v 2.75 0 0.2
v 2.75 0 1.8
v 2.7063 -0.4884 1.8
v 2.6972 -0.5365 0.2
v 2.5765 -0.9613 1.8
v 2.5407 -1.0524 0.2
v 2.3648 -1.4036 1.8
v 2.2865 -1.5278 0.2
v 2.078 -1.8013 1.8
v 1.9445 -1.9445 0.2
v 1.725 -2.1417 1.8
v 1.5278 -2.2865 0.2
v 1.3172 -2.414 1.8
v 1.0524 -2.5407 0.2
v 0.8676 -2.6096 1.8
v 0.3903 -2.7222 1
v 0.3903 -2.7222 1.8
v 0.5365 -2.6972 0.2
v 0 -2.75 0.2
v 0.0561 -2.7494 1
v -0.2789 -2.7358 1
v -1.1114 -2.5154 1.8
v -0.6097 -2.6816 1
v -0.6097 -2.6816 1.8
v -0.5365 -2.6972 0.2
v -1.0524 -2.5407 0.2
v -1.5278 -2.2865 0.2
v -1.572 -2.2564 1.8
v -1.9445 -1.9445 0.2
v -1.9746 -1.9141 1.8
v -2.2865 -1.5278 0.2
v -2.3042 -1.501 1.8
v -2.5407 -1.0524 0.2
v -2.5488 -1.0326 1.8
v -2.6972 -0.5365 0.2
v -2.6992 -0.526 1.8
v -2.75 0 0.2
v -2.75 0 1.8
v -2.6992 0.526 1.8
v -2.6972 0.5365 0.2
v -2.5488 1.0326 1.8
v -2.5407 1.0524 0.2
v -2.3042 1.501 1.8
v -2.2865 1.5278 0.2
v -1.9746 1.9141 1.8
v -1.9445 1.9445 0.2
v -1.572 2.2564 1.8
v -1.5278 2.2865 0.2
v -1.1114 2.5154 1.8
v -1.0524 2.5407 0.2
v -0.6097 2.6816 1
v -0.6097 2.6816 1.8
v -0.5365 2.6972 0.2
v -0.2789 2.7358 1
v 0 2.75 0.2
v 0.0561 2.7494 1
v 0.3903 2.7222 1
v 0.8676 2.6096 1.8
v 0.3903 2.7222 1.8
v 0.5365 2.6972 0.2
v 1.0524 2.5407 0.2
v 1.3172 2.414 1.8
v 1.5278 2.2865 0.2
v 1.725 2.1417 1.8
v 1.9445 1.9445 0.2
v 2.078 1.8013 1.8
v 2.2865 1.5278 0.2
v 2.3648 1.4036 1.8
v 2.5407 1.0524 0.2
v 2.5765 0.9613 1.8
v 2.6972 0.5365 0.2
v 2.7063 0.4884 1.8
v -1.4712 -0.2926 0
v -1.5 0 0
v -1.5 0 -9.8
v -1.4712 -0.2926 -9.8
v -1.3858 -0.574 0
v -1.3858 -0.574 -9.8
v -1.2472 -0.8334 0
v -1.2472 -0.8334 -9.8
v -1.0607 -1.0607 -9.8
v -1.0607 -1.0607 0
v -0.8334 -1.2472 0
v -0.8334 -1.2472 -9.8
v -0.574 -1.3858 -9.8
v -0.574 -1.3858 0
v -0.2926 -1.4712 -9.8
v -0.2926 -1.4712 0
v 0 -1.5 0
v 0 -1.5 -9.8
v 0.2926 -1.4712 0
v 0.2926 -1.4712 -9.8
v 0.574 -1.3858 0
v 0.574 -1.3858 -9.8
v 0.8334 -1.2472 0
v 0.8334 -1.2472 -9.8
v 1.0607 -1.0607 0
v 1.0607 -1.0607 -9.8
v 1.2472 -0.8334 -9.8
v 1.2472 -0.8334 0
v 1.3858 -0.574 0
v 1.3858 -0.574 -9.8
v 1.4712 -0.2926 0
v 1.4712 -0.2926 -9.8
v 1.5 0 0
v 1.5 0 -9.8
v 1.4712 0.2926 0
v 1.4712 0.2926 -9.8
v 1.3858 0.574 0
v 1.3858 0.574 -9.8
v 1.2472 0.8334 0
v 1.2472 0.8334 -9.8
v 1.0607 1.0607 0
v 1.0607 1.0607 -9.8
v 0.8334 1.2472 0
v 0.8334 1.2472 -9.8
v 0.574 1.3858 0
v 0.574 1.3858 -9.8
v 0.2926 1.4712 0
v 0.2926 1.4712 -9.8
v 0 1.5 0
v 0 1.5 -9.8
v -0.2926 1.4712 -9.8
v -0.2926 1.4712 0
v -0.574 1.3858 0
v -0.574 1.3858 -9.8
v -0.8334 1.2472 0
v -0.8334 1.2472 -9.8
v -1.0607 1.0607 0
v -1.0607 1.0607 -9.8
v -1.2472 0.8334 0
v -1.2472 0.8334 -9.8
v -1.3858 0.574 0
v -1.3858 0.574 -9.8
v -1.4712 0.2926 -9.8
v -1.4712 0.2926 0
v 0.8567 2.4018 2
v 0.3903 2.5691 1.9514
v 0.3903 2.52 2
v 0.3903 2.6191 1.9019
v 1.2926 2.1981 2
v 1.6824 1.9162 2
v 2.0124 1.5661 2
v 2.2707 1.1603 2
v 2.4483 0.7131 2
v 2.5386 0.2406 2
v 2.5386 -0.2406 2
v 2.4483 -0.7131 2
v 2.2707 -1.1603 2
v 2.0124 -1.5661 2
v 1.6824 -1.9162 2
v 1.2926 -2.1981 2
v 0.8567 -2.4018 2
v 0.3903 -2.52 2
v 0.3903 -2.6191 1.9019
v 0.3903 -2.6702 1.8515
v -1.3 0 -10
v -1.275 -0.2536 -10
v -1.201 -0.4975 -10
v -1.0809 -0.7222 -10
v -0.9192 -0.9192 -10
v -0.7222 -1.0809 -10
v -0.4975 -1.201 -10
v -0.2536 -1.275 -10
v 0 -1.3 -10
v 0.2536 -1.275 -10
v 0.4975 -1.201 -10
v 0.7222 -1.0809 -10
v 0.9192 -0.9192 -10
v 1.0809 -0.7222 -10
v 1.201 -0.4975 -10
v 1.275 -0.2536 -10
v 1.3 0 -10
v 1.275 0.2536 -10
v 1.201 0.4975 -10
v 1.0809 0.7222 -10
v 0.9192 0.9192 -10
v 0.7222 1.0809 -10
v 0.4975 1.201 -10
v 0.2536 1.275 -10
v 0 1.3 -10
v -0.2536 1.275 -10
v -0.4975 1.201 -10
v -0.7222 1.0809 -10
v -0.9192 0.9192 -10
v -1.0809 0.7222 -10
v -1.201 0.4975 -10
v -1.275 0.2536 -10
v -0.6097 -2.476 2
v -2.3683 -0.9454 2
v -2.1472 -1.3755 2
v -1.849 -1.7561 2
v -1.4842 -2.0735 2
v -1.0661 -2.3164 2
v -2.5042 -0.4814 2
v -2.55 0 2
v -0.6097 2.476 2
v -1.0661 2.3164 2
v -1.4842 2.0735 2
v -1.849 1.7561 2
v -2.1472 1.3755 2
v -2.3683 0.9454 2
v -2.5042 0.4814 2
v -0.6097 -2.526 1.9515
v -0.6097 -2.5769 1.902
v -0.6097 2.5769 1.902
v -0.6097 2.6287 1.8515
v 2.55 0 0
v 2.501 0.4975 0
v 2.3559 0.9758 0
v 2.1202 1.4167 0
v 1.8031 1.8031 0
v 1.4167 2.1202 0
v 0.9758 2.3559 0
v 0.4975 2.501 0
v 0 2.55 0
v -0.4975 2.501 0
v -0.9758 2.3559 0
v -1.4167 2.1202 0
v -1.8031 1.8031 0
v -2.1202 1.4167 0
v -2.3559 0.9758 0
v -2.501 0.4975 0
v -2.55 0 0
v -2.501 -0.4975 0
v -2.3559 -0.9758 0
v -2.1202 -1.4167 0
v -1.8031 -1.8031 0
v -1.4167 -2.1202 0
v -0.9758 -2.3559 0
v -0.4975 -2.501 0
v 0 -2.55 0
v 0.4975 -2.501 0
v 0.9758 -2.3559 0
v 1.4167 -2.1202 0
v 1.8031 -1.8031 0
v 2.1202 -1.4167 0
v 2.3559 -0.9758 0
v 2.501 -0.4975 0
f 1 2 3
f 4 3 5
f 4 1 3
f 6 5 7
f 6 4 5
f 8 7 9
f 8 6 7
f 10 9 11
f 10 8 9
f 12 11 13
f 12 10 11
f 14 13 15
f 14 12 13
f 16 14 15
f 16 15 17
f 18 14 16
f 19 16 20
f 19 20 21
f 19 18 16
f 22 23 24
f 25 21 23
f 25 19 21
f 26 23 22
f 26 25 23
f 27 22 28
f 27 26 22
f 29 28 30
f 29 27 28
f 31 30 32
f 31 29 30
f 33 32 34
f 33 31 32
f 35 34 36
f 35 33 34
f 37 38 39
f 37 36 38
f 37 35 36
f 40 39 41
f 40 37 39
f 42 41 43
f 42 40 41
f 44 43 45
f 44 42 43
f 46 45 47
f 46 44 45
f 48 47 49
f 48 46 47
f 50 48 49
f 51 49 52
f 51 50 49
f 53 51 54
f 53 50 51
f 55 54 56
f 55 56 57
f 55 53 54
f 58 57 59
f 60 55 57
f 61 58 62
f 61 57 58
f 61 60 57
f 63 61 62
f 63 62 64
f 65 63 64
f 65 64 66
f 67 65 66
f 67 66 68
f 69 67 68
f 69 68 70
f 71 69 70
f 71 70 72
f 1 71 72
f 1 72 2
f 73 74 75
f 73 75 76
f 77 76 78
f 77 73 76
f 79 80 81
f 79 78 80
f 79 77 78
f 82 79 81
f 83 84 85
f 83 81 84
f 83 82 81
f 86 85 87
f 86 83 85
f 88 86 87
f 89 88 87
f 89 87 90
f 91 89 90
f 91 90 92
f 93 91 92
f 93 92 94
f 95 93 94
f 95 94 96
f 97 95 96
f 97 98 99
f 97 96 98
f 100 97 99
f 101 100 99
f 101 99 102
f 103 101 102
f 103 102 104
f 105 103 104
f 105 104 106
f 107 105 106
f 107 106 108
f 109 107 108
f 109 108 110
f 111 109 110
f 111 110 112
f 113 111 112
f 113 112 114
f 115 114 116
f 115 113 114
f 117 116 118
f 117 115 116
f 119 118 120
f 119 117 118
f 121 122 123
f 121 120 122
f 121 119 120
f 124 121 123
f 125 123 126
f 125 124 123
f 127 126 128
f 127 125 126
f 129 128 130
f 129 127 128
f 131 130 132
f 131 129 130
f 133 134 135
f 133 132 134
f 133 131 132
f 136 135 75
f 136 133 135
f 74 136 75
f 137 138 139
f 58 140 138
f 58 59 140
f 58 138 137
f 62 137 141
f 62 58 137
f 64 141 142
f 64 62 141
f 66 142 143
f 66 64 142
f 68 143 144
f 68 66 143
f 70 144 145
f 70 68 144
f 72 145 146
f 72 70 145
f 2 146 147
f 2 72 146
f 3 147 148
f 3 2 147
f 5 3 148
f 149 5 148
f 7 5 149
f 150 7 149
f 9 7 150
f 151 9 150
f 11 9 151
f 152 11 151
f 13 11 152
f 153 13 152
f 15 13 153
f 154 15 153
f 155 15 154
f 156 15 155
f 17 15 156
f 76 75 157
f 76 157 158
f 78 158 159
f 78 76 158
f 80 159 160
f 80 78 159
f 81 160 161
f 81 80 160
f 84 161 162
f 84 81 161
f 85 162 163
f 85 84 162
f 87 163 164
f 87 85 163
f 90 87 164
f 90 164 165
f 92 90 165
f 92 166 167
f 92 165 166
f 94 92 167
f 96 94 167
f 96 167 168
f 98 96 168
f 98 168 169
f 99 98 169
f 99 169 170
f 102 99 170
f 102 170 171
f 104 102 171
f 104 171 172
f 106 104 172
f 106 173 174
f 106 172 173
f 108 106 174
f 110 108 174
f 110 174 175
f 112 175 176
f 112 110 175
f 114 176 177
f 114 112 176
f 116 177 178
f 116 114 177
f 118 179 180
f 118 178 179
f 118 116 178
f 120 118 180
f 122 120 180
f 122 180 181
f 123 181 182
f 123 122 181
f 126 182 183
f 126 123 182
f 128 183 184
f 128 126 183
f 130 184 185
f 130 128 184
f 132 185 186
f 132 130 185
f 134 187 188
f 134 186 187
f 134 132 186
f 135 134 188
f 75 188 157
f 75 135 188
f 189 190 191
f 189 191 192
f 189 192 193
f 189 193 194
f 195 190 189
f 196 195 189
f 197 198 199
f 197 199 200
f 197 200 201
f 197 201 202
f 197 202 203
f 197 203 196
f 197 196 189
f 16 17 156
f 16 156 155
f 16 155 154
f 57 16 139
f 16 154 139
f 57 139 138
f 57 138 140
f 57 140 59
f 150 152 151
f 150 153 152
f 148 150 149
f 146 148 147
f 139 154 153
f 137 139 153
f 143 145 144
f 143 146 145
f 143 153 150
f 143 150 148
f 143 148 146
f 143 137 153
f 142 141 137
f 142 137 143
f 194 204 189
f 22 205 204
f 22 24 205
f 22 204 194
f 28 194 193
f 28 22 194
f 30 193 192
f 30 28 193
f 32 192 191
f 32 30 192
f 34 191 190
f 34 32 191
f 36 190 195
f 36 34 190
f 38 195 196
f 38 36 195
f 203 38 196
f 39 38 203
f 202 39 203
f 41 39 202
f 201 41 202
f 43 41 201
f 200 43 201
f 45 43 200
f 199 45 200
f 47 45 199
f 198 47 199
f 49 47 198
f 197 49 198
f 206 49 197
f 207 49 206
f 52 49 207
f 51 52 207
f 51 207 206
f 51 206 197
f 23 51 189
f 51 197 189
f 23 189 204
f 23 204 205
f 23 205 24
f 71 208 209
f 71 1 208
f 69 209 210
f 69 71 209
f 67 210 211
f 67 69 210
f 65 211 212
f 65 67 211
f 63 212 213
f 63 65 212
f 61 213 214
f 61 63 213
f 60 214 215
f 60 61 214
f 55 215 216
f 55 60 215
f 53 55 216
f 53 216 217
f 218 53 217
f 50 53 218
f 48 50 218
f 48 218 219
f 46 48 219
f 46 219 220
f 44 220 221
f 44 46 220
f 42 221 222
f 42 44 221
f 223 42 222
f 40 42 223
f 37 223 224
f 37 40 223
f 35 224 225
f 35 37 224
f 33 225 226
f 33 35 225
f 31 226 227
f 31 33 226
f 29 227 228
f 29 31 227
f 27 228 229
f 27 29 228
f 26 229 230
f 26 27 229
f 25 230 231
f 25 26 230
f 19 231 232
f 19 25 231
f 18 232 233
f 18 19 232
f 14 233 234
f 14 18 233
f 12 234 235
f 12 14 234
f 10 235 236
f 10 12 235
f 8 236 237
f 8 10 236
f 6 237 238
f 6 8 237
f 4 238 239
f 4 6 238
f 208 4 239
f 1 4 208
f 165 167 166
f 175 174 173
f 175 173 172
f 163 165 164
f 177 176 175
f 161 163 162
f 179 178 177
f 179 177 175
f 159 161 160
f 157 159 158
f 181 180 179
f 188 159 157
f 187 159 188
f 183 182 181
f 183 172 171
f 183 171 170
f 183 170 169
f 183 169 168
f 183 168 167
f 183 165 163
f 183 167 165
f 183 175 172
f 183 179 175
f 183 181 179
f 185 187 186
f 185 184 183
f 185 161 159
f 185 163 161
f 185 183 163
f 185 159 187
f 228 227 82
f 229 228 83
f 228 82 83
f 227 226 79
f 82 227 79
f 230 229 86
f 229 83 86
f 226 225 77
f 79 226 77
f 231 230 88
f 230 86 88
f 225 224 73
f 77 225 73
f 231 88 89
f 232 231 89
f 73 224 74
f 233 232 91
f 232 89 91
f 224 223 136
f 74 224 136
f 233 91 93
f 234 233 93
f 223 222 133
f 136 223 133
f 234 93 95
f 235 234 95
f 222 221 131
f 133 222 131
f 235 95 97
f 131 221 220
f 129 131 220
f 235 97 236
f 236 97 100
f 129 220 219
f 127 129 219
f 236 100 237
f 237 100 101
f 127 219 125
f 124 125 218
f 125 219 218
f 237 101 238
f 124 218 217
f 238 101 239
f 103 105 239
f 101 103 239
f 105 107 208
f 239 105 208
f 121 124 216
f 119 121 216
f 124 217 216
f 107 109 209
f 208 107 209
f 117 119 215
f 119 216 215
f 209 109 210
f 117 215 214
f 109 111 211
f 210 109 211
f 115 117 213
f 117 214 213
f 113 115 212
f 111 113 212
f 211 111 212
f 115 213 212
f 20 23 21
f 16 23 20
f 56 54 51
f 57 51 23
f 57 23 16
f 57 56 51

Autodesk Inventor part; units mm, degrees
ref_plane "YZ Plane" through (0, 0, 0) normal (1, 0, 0) x (0, 1, 0)
ref_plane "XZ Plane" through (0, 0, 0) normal (0, 1, 0) x (-1, 0, 0)
ref_plane "XY Plane" through (0, 0, 0) normal (0, 0, 1) x (1, 0, 0)
sketch "Náčrt1" plane through (0, 0, 0) normal (0, 0, 1) x (1, 0, 0)
  circle A0 centre (0, 0) radius 2.75
  dimension "d0" = 5.5
extrude "Vysunutí1" add sketch "Náčrt1" along normal blind 2
chamfer "Zkosení1" distance 0.2 angle 45 1 edges at (-2.75, 0, 2)
chamfer "Zkosení2" distance 0.2 angle 45 1 edges at (-2.75, 0, 0)
sketch "Náčrt2" plane through (0, 0, 2) normal (0, 0, 1) x (1, 0, 0)
  line L0 (-0.6097, -6) -> (0.3903, -6)
  line L1 (0.3903, -6) -> (0.3903, 6)
  line L2 (0.3903, 6) -> (-0.6097, 6)
  line L3 (-0.6097, 6) -> (-0.6097, -6)
  line L4 (-0.6097, -6) -> (0.3903, 6) construction
  line L5 (0.3903, -6) -> (-0.6097, 6) construction
  point P0 (0, 0)
  point P1 (-0.1097, 0)
  dimension "d9" = 1
extrude "Vysunutí2" cut sketch "Náčrt2" against normal blind 1
sketch "Náčrt3" plane through (0, 0, 0) normal (0, 0, -1) x (-1, 0, 0)
  circle A0 centre (0, 0) radius 1.5
  dimension "d12" = 3
extrude "Vysunutí3" add sketch "Náčrt3" along normal blind 10
chamfer "Zkosení3" distance 0.2 angle 45 1 edges at (1.5, 0, -10)
thread "Závit1" size "M3x0.5" class "6g" standard "ANSI Metric M Profile" full length
properties part number "Bolt-M3x10" material "Ocel, vysokopevnostní, nízkolegovaná"
